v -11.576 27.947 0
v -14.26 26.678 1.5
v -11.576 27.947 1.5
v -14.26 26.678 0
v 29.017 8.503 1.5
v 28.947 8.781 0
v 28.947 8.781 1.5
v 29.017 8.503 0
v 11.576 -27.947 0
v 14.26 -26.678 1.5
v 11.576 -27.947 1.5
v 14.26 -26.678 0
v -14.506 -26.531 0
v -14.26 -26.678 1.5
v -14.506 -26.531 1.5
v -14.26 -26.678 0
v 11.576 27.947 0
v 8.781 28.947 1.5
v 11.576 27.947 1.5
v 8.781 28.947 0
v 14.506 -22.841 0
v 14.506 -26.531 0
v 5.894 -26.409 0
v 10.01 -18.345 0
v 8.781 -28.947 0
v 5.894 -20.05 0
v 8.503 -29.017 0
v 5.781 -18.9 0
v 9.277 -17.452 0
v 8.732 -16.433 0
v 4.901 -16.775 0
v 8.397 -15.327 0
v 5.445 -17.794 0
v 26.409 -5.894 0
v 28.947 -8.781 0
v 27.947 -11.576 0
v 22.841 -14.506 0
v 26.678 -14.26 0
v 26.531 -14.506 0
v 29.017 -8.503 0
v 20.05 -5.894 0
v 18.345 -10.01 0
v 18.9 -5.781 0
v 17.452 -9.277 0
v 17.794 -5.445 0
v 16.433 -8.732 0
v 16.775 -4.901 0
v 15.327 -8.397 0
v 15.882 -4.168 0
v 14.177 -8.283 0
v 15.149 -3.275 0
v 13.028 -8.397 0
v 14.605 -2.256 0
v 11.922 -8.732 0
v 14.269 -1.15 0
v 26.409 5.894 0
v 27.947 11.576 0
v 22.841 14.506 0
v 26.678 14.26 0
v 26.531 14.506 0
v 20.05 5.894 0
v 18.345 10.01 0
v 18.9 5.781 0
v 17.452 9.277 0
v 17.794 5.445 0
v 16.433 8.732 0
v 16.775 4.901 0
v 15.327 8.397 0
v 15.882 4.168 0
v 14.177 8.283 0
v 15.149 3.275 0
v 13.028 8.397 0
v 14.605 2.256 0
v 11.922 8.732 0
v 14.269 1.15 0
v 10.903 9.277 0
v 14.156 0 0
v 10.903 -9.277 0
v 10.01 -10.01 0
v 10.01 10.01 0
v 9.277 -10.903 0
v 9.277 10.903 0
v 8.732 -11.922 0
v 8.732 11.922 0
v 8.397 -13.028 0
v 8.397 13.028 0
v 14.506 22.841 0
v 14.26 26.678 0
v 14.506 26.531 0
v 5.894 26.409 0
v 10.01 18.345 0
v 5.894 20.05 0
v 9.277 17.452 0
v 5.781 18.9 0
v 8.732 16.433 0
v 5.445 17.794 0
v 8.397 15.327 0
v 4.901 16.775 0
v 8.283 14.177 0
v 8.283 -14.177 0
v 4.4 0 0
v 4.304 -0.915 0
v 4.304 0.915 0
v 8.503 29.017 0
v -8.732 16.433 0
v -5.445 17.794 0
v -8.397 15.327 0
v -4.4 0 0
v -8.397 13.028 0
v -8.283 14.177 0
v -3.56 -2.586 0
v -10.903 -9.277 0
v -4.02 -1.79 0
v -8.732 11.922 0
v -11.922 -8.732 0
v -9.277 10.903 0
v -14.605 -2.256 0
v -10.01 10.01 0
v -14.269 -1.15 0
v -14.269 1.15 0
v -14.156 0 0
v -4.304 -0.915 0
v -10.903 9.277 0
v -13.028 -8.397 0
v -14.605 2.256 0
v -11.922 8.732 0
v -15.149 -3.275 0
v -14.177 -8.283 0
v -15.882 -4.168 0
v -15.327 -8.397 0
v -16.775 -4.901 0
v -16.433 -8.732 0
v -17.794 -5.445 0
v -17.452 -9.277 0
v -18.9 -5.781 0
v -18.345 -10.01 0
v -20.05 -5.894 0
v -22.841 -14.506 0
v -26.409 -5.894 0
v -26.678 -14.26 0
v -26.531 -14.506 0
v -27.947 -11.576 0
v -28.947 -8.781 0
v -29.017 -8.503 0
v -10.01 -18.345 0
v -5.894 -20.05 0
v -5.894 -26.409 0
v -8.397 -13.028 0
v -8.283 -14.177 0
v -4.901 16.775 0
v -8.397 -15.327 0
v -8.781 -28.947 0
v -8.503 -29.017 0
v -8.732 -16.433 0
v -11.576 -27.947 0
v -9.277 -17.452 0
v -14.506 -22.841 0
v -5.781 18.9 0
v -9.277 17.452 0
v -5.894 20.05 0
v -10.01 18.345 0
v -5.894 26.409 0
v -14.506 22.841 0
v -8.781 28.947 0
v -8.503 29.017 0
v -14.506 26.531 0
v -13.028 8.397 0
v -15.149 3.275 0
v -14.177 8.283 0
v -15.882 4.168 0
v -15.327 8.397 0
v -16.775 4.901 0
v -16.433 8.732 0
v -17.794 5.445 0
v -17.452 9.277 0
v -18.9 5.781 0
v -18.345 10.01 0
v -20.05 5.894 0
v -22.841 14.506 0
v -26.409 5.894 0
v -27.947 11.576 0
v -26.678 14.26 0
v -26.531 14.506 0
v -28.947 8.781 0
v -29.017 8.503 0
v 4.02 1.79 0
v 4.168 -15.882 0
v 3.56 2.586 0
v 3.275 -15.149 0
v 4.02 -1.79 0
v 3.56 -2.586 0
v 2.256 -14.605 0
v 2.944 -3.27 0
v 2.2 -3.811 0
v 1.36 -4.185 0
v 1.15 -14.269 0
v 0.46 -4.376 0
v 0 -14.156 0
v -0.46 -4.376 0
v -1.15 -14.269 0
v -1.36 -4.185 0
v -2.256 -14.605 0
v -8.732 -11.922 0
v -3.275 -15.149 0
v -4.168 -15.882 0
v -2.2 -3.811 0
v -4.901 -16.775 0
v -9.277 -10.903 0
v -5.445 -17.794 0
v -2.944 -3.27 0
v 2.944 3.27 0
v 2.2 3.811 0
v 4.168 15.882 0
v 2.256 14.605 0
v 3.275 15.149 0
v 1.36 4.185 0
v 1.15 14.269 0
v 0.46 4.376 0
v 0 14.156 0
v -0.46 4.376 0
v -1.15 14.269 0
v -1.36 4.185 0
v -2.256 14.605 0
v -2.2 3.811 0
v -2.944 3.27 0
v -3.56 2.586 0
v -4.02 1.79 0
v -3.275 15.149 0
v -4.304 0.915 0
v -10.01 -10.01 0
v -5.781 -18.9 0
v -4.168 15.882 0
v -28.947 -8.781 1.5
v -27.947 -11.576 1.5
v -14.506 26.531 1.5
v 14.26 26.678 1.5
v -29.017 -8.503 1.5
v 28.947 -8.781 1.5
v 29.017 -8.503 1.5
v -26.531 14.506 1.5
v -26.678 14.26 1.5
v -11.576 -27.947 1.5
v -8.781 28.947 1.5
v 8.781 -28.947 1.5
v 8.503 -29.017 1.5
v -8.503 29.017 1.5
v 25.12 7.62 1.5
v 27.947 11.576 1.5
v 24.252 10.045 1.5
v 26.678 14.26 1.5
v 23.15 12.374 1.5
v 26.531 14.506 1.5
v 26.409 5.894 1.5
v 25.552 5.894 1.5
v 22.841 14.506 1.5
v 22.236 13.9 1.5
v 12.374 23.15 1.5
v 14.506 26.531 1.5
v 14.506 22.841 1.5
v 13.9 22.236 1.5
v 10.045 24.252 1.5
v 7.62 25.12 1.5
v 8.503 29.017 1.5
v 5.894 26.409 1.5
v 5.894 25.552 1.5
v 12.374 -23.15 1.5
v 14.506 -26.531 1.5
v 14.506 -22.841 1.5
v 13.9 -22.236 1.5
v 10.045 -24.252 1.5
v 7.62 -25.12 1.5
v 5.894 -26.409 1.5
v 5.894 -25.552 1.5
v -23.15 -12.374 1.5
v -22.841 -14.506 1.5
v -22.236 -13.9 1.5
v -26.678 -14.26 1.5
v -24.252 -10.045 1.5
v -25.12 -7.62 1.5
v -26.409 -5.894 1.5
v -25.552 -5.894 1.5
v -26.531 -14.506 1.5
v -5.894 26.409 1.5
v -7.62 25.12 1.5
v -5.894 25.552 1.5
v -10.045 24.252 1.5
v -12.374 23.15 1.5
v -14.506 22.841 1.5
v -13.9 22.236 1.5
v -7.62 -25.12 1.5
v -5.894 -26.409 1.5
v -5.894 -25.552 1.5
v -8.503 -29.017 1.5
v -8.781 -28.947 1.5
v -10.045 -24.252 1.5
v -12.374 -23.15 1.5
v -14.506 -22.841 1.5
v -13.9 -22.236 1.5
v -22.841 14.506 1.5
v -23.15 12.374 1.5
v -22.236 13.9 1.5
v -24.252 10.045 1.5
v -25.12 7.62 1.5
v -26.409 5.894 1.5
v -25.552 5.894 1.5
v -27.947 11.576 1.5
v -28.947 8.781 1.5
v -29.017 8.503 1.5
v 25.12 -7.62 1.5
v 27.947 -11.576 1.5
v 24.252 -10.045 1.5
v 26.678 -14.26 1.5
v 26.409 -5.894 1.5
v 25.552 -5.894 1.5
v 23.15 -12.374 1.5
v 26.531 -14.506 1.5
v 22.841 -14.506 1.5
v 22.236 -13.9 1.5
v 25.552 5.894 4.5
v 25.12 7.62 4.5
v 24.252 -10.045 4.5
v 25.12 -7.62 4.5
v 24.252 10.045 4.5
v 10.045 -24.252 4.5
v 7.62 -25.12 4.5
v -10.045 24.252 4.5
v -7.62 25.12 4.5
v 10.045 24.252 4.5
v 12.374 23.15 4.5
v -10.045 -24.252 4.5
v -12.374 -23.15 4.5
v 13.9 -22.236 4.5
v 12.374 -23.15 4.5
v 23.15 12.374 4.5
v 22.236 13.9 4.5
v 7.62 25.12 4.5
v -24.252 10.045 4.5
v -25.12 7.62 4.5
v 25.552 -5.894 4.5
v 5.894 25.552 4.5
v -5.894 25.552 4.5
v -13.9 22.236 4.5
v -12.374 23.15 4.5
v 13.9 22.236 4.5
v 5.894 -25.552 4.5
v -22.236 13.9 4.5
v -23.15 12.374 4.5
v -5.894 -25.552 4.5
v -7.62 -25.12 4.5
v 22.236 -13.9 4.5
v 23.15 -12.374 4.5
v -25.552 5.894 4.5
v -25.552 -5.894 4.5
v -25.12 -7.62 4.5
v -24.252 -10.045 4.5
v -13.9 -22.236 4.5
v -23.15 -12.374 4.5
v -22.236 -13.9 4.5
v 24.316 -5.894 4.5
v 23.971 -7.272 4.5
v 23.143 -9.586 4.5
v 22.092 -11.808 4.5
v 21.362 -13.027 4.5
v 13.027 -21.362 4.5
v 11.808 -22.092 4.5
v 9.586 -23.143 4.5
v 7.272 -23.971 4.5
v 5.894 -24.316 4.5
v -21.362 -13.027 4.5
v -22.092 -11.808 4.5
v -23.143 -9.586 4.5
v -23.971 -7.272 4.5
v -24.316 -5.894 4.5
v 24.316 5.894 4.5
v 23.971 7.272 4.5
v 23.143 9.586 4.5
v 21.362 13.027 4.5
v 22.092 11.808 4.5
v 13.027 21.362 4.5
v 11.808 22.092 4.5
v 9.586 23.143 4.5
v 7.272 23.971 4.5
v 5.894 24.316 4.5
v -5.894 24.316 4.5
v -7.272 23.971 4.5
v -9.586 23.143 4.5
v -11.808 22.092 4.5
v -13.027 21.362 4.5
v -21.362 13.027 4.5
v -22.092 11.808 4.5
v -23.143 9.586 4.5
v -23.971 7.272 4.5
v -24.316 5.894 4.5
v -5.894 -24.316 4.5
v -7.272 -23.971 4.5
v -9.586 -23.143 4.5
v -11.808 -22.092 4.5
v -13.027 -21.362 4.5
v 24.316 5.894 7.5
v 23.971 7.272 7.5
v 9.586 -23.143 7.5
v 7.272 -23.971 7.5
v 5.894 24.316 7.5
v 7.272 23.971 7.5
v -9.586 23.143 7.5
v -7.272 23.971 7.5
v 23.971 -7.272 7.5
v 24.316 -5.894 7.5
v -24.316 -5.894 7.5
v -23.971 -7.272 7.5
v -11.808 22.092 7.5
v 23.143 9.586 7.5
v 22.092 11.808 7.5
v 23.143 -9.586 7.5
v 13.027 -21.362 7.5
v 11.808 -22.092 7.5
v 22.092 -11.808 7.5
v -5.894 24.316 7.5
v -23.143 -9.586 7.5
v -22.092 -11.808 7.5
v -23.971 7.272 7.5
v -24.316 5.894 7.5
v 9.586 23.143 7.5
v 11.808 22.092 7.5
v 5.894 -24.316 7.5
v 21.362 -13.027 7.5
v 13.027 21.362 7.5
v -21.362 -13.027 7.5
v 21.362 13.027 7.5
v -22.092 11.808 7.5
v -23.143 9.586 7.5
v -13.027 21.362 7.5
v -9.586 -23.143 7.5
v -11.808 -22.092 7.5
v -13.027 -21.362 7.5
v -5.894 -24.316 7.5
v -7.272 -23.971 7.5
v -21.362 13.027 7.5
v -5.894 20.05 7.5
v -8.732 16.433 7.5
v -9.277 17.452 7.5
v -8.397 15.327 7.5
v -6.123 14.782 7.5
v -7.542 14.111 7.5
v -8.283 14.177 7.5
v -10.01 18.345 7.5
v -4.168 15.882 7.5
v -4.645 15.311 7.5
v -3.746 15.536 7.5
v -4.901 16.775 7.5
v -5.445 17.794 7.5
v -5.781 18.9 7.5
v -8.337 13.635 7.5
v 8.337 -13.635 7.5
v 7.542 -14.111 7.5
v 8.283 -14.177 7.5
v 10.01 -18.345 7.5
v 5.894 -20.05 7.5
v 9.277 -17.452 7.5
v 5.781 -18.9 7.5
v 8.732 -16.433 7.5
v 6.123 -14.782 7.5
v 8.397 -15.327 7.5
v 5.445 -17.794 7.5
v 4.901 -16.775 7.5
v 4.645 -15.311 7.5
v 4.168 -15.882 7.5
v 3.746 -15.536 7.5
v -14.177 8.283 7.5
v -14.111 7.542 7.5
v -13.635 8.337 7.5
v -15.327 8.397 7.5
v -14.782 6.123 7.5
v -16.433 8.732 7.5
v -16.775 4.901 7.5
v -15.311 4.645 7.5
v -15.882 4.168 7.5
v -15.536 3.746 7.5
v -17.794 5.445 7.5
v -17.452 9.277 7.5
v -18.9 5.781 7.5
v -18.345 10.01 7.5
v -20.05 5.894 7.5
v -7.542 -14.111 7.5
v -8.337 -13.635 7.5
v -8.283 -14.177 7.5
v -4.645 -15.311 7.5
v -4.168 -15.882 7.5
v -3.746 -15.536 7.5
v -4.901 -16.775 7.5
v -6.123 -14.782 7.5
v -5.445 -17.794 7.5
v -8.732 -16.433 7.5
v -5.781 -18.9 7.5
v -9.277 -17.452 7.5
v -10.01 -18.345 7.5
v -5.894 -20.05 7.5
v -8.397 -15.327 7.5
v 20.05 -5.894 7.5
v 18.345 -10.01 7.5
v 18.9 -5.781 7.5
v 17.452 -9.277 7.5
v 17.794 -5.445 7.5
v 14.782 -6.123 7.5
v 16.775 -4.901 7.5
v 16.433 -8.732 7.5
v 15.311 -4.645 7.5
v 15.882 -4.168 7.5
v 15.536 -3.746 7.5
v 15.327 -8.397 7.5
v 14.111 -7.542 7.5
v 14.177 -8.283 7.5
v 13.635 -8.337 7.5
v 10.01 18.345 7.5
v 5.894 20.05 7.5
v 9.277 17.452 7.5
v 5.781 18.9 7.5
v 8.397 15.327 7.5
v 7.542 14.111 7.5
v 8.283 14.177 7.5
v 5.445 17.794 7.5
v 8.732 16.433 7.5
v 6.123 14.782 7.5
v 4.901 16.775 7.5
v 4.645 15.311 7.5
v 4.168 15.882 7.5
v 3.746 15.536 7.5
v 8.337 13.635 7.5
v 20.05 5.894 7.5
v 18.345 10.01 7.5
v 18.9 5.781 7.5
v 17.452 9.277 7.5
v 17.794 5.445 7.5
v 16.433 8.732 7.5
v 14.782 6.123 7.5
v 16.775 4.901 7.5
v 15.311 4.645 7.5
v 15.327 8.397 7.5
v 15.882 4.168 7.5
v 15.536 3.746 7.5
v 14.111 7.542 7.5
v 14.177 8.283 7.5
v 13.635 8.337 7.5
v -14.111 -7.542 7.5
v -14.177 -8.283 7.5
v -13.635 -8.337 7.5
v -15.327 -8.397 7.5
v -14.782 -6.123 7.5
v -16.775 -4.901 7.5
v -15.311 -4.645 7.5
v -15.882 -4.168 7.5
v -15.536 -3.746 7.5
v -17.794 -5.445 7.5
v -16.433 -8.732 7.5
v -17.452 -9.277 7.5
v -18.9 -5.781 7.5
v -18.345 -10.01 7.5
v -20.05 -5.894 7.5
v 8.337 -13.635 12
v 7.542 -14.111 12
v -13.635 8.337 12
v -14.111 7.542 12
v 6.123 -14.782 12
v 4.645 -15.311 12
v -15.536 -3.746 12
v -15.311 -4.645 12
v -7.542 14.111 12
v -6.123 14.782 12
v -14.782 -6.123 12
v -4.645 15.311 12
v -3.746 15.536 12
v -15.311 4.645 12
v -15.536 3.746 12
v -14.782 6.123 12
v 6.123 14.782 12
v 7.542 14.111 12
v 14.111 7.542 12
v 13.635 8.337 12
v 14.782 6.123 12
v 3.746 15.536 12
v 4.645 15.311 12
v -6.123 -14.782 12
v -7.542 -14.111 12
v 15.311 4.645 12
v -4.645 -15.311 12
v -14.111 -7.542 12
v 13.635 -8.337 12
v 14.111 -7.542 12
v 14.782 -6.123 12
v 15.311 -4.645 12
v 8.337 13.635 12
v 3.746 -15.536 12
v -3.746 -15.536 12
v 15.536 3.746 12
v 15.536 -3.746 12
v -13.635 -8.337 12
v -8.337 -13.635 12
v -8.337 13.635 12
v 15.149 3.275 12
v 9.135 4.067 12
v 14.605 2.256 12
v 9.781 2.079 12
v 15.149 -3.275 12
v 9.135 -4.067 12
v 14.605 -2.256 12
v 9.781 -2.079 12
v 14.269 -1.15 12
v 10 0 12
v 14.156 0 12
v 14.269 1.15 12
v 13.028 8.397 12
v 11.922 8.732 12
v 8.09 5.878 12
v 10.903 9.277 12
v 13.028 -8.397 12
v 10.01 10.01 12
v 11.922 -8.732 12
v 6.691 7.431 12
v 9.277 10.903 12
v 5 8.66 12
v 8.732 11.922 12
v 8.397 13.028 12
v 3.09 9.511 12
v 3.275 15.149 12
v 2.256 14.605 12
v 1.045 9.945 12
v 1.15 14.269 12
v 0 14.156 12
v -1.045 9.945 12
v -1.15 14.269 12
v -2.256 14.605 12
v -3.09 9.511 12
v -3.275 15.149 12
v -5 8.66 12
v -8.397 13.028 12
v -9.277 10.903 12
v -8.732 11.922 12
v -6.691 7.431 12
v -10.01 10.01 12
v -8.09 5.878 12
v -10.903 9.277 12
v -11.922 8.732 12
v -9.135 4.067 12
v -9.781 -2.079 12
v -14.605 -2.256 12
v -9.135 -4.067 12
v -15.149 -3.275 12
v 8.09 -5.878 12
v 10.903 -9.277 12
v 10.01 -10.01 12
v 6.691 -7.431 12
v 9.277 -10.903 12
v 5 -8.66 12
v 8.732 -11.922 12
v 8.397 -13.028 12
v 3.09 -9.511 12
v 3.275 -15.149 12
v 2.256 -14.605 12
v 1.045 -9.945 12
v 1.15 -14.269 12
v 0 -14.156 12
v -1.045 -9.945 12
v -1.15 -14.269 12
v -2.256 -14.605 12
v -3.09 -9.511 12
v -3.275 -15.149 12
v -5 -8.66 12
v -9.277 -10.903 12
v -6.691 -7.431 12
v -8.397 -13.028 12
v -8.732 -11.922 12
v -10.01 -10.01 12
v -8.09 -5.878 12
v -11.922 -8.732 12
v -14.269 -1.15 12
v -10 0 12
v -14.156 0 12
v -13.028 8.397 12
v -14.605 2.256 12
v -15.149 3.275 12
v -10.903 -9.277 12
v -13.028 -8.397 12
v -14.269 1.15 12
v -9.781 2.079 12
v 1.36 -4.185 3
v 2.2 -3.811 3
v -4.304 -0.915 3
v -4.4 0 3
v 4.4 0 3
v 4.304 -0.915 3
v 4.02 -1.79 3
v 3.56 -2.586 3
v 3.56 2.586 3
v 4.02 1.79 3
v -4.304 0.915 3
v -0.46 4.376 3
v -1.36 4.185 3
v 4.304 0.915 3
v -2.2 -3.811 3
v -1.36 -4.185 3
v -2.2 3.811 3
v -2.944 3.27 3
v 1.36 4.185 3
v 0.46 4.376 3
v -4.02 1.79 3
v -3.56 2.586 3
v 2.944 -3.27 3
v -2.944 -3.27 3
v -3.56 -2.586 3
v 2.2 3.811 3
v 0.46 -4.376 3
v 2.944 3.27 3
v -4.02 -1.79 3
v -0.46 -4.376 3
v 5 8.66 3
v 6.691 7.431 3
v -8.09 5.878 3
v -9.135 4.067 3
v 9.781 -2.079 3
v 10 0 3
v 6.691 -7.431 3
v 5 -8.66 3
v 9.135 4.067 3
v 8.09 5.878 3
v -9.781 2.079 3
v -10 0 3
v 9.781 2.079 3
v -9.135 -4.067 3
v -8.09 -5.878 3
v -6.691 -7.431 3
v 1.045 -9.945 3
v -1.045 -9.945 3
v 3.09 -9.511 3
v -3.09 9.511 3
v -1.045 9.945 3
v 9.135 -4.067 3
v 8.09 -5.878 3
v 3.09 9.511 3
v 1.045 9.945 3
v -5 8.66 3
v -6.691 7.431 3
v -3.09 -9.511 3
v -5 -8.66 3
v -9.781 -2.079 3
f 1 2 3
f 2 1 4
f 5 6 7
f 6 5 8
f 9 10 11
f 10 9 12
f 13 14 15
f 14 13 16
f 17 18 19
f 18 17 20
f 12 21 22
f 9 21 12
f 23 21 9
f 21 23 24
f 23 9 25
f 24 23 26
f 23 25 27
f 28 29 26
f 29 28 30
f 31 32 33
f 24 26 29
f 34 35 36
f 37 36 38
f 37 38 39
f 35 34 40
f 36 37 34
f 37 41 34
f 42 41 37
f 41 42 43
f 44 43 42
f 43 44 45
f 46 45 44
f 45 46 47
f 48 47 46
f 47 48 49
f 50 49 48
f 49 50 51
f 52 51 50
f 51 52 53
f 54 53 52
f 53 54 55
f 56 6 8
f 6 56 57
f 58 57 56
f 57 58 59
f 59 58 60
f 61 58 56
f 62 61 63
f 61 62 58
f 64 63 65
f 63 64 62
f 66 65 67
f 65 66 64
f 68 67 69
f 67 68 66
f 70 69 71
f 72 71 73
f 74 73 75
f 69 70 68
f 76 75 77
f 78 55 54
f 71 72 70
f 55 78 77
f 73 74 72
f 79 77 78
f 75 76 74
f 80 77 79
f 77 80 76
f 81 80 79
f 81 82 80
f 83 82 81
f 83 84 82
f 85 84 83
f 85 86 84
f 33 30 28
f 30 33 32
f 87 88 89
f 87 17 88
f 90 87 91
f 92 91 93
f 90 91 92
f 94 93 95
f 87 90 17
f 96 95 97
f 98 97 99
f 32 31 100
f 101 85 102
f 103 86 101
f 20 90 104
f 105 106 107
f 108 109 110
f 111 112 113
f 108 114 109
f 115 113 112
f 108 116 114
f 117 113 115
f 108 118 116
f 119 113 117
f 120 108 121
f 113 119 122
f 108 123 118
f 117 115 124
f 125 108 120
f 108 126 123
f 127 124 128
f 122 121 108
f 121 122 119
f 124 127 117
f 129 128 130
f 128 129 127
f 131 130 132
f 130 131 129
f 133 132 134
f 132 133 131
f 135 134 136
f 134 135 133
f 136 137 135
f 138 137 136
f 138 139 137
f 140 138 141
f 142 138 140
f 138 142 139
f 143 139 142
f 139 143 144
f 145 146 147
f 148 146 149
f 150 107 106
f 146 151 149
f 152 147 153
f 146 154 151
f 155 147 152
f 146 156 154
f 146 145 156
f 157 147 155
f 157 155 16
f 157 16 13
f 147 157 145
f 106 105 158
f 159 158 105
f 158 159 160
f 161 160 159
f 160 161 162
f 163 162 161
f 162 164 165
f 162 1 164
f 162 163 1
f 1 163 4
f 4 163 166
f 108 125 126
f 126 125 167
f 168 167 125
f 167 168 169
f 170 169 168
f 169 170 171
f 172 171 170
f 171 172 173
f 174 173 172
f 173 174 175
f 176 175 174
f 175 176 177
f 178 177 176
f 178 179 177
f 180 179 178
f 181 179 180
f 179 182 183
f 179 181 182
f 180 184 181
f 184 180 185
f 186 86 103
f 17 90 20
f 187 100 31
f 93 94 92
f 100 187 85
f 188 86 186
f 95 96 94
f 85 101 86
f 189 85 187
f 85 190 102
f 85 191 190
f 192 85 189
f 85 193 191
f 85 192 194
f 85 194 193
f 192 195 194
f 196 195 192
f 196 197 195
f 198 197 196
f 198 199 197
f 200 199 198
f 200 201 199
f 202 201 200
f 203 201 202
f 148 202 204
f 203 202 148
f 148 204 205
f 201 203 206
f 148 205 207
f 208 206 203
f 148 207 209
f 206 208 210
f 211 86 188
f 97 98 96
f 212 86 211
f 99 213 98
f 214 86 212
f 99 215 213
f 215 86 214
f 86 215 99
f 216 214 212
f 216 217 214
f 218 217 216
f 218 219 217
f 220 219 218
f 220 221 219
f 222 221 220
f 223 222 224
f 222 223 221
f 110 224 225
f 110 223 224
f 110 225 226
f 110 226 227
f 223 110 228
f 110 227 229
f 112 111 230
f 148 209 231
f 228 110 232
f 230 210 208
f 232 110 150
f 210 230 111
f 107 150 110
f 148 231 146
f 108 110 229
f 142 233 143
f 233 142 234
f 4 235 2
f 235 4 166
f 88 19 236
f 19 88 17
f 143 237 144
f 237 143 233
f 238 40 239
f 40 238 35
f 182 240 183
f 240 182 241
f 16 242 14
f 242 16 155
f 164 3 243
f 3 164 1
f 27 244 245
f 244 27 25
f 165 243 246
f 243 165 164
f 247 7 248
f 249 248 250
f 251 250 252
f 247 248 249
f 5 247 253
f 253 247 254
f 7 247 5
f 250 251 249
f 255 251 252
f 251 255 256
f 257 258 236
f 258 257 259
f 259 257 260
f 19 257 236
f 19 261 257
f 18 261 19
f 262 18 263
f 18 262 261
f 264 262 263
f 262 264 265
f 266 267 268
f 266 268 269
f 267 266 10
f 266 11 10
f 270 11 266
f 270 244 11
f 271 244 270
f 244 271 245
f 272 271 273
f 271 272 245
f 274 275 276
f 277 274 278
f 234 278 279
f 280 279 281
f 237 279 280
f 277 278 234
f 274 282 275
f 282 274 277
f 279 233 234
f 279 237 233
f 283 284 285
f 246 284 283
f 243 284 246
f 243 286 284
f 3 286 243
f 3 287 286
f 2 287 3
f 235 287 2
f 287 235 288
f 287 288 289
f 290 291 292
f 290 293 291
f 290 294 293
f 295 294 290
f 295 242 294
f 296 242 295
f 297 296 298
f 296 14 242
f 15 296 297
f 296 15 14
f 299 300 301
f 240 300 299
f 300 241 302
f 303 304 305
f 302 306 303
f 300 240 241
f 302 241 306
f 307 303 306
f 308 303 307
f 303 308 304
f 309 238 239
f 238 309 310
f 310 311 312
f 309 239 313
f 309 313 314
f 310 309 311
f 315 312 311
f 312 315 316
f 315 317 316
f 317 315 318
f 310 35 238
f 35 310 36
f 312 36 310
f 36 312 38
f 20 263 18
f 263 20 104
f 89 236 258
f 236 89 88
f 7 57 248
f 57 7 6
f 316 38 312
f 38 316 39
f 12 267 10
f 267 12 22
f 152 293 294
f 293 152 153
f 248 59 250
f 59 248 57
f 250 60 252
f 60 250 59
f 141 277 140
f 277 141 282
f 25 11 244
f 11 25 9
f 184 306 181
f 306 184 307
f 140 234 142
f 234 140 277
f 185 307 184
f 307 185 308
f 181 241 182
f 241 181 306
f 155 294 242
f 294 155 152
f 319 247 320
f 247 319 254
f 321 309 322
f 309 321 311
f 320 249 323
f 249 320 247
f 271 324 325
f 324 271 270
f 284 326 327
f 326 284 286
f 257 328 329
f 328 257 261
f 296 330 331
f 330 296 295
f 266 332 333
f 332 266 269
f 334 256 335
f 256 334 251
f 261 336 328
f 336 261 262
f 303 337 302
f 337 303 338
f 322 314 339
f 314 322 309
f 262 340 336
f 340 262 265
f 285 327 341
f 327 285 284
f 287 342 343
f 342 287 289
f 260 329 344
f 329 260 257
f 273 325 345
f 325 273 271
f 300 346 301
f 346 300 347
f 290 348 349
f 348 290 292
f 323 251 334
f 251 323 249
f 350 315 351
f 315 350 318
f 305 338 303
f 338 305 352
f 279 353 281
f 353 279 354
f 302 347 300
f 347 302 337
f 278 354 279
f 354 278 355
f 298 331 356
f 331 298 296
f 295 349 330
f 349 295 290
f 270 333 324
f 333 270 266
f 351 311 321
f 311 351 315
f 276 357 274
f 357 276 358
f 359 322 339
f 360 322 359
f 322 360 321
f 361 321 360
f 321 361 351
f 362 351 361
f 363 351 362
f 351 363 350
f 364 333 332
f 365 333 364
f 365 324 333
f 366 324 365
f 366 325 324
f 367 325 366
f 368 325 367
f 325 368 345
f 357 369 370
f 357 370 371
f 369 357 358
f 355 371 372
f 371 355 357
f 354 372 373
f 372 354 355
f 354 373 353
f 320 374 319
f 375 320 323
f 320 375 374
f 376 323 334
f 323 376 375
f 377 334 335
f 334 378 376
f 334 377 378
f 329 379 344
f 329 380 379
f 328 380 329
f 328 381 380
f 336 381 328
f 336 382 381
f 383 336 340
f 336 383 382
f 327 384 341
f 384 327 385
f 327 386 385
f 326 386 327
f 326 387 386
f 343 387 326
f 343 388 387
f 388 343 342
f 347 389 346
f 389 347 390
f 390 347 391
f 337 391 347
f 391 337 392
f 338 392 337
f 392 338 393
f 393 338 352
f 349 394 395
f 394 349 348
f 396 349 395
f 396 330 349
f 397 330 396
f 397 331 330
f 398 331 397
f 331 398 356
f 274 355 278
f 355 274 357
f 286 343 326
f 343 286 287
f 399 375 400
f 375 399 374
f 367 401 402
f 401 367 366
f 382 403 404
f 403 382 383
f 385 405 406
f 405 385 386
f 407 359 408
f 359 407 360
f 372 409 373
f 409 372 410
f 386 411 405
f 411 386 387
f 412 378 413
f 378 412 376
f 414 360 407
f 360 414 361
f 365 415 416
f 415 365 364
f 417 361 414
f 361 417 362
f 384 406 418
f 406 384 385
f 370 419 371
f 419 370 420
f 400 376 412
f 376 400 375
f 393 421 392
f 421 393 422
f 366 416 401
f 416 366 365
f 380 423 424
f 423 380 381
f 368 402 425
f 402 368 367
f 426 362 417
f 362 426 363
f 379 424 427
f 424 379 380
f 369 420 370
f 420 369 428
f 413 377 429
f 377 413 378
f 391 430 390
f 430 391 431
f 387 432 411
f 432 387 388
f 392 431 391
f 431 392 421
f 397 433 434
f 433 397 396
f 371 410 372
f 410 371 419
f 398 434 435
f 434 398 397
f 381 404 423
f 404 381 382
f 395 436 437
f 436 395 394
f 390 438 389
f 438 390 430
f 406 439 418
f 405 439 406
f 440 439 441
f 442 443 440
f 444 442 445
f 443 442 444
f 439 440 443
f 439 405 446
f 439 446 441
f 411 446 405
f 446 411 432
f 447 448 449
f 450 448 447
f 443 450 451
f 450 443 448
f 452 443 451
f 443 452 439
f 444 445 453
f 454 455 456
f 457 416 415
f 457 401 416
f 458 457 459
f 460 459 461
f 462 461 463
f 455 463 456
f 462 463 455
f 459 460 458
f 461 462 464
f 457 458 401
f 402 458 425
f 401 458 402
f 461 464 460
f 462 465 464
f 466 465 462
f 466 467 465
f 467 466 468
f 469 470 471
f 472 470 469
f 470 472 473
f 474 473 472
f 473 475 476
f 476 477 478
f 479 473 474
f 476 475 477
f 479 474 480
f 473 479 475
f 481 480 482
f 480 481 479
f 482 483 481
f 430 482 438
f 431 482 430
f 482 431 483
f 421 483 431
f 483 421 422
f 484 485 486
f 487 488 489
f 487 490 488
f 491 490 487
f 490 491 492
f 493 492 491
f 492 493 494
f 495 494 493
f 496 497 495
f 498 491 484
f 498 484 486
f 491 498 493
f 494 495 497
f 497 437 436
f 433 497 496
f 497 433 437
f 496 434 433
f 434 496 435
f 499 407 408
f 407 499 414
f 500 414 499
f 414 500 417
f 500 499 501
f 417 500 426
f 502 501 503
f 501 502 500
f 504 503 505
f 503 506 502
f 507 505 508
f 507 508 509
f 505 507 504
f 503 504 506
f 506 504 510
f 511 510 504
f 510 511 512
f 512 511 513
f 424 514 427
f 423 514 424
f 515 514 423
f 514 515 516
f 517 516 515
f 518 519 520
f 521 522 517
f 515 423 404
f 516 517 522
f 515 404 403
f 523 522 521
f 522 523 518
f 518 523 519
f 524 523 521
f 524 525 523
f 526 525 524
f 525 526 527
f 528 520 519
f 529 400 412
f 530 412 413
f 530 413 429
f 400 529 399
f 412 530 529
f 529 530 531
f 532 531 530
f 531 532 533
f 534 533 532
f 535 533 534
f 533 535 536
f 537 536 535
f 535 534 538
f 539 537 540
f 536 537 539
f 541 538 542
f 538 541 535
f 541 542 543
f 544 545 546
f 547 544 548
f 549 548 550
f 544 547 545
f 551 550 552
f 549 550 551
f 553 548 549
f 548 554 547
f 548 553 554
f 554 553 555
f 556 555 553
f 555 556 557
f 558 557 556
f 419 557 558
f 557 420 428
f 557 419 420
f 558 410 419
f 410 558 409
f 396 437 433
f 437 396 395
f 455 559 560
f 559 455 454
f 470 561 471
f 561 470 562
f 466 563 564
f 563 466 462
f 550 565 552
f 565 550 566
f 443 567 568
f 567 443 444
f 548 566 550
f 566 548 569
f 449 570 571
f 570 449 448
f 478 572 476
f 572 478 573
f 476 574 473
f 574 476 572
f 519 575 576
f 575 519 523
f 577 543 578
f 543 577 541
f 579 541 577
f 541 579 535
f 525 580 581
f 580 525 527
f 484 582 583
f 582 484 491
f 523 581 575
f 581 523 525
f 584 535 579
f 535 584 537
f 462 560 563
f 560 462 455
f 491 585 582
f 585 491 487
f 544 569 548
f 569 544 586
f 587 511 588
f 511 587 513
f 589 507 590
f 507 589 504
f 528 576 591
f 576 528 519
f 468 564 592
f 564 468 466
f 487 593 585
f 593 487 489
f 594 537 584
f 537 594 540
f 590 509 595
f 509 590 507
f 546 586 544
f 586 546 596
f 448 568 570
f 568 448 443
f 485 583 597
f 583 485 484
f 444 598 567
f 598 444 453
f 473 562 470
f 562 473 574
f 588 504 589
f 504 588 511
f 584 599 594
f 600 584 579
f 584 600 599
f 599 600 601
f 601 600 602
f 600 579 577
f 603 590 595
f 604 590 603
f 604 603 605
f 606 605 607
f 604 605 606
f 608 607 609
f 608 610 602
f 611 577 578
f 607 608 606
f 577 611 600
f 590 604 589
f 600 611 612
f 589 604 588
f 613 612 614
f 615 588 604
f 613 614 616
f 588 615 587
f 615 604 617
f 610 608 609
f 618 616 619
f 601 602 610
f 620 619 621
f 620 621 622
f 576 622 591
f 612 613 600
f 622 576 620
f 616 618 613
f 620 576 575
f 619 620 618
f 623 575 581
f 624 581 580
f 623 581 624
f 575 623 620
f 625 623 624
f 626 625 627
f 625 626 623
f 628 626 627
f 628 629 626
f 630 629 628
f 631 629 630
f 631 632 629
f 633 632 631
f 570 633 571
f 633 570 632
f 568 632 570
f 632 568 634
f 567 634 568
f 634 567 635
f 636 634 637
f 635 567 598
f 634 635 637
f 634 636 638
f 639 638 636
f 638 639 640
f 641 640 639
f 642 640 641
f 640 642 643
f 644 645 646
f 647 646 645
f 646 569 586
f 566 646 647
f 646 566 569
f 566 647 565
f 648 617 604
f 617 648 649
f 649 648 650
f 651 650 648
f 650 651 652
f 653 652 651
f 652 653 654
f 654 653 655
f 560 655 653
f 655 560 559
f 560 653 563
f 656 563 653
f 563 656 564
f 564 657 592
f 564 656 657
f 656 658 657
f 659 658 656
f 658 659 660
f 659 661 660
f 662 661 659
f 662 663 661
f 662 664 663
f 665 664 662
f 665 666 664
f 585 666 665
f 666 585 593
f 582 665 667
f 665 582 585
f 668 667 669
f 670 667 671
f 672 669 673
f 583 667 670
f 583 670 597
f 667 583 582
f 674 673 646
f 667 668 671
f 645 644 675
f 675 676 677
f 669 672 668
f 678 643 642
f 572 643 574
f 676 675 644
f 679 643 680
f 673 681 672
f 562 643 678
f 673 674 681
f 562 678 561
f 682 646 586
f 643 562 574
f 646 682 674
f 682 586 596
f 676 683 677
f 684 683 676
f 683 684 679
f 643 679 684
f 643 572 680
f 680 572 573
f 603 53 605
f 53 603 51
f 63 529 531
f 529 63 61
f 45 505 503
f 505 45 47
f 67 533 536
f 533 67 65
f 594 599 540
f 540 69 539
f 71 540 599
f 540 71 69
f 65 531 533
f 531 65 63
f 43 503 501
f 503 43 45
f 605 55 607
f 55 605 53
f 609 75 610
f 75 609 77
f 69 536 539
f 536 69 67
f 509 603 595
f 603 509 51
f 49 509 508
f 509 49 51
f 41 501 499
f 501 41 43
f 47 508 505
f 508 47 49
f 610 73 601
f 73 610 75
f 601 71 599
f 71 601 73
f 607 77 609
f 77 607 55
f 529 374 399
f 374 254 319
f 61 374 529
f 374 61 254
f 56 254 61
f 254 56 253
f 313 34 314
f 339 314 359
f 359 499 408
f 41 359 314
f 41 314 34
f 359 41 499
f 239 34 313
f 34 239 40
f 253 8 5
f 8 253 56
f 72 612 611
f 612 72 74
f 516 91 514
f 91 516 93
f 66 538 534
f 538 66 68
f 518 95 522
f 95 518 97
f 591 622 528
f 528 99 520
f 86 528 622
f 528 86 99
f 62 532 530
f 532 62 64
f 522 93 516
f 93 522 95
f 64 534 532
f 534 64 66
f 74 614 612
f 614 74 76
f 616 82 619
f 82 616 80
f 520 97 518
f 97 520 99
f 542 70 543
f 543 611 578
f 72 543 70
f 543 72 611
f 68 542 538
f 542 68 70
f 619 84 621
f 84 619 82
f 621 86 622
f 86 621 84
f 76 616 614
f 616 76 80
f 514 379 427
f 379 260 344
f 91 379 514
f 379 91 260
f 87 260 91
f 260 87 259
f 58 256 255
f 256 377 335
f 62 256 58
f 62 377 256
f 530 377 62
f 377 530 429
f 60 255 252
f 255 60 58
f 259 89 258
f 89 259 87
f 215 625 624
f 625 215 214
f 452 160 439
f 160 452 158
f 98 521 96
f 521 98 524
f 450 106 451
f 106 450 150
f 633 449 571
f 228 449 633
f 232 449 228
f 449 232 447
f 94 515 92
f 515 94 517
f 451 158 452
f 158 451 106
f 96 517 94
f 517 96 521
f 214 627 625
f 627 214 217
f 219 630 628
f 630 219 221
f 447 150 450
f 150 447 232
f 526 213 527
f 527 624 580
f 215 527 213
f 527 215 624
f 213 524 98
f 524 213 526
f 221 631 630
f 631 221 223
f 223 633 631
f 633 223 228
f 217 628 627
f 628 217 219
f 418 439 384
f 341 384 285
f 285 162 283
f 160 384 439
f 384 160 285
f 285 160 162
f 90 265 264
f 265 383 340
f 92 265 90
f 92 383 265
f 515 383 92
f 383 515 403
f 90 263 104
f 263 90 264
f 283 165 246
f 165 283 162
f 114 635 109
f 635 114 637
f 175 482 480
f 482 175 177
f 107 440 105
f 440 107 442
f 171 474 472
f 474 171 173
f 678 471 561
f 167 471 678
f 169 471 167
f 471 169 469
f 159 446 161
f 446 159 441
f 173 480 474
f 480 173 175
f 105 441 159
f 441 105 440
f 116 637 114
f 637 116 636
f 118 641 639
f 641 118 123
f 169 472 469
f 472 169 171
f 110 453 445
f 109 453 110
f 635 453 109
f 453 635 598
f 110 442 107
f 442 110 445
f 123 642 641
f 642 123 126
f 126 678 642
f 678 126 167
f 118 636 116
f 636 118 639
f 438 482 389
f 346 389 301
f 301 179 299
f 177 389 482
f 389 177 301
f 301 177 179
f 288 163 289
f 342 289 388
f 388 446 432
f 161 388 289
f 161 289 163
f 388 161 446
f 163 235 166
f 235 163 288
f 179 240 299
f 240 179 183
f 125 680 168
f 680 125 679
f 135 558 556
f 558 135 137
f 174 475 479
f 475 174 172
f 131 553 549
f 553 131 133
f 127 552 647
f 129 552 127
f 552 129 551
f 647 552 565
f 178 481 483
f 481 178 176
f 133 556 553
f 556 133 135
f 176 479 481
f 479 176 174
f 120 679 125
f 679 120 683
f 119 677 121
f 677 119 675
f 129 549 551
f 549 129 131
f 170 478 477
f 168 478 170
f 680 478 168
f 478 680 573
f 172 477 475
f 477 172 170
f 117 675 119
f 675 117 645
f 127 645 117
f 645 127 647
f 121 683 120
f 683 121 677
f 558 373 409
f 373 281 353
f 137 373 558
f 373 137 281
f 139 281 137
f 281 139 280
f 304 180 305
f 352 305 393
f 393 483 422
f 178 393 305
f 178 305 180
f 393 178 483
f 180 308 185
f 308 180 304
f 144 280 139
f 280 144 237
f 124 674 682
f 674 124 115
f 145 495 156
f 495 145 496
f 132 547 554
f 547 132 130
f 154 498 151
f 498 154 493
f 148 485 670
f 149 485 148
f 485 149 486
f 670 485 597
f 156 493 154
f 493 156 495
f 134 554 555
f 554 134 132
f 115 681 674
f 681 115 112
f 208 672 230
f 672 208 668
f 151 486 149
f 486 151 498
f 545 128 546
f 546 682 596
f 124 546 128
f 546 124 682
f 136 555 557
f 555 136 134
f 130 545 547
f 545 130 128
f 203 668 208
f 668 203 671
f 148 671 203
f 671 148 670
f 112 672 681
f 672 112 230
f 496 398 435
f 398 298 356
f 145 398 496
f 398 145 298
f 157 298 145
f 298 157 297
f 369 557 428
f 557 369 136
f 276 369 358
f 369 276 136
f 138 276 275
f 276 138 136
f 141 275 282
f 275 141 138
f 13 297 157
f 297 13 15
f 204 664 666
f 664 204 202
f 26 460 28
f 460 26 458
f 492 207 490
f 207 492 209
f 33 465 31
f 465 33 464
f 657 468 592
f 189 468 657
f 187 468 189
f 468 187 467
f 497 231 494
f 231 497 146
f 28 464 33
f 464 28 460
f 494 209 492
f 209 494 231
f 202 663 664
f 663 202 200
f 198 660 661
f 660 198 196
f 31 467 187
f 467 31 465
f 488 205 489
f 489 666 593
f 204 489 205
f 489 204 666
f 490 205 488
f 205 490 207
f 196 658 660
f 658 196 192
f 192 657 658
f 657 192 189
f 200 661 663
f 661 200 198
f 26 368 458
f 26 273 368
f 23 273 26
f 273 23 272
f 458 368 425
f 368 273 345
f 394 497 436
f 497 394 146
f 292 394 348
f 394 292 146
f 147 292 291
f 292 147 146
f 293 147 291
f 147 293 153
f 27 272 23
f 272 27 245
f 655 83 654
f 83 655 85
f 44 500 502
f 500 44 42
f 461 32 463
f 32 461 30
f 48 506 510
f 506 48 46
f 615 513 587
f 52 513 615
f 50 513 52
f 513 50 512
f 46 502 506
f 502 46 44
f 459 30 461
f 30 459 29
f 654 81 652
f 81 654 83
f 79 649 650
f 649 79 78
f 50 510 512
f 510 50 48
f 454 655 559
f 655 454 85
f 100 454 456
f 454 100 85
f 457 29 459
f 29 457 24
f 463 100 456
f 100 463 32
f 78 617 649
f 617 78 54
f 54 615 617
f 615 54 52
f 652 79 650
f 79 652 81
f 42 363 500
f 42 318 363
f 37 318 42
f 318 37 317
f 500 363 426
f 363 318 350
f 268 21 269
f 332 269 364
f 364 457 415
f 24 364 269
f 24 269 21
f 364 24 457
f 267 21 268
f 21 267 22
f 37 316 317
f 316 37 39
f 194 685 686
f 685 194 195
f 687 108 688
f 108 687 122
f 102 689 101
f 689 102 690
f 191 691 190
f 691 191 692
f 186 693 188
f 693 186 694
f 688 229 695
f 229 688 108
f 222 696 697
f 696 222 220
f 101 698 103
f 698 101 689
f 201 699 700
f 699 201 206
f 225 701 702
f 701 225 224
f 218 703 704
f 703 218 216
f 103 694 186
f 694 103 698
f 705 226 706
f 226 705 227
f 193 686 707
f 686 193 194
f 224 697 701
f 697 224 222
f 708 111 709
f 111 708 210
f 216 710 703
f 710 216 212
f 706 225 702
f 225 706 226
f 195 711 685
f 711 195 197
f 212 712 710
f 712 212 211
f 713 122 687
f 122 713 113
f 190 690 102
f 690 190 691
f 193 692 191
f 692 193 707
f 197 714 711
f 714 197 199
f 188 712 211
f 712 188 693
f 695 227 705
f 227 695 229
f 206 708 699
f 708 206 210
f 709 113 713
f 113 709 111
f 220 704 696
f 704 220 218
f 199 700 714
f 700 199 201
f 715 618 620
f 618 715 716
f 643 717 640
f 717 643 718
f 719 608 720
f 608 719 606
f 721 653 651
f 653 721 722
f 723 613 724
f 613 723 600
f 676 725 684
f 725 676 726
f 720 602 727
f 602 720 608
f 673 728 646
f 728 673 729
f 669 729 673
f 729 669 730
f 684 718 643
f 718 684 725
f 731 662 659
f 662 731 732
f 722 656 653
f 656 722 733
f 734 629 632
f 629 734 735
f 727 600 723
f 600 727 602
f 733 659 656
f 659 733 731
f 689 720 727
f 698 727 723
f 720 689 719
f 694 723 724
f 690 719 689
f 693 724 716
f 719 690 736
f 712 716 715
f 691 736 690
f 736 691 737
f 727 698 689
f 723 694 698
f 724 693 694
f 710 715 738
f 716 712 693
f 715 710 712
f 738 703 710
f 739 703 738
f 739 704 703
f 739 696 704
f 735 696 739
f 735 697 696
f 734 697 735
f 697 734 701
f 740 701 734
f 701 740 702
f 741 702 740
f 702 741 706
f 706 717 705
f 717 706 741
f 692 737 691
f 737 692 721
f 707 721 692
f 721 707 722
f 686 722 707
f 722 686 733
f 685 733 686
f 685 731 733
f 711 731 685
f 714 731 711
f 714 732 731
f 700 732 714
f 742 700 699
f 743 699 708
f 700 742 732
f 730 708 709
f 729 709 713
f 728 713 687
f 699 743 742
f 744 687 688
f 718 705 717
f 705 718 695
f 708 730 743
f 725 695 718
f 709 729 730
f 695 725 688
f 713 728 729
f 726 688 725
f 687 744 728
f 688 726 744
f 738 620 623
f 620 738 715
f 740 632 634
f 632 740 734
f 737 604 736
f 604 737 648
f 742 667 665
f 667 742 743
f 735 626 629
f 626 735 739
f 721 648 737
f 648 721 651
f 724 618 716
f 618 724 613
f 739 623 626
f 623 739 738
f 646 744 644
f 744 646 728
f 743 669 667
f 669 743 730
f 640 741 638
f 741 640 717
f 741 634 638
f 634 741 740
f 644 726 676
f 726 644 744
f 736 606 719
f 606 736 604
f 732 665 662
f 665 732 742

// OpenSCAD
// RebeliX
//
// spool-center
// GNU GPL v3
// Martin Neruda <neruda@reprap4u.cz>
// http://www.reprap4u.cz

// Prumer otvoru v civce
spool_hole_biggest = 52.5; // "Fillamentum"
spool_hole_big = 50.1; // "plasty Mladec"
spool_hole_small = 32; // "MK Floria"

union() {
    difference()
    {
	    union ()
	    {
            cylinder(h=1.5, r=(spool_hole_biggest/2)+4,$fn=64);
		    cylinder(h=4.5,r=(spool_hole_biggest/2),$fn=64);
            cylinder(h=7.5,r=(spool_hole_big/2),$fn=64);
		    cylinder(h=12,r=(spool_hole_small/2),$fn=64);
	    }
	    translate([0,0,-0.1]) cylinder (h=13,r=4.4,$fn=30);
		for ( i = [0 : 45 : 360] ){
		  rotate([0,0,i]) {
			translate([spool_hole_big/2 - 5,0,0]) cylinder(r=spool_hole_big/8.5,h=30, $fn=32,center=true);
			translate([spool_hole_big/2 + spool_hole_big/8.5 - 5,0,0]) cube([2*(spool_hole_big/8.5),2*(spool_hole_big/8.5),20],center=true);
			translate([spool_hole_big/2 + 4,- 5,0]) rotate([0,0,45]) cube([5,5,5],center=true);
			translate([spool_hole_big/2 + 4,+ 5,0]) rotate([0,0,45]) cube([5,5,5],center=true);
		  }
		}		
		translate([0,0,3]) cylinder(h=10,r=(spool_hole_small-12)/2);
    }
}
